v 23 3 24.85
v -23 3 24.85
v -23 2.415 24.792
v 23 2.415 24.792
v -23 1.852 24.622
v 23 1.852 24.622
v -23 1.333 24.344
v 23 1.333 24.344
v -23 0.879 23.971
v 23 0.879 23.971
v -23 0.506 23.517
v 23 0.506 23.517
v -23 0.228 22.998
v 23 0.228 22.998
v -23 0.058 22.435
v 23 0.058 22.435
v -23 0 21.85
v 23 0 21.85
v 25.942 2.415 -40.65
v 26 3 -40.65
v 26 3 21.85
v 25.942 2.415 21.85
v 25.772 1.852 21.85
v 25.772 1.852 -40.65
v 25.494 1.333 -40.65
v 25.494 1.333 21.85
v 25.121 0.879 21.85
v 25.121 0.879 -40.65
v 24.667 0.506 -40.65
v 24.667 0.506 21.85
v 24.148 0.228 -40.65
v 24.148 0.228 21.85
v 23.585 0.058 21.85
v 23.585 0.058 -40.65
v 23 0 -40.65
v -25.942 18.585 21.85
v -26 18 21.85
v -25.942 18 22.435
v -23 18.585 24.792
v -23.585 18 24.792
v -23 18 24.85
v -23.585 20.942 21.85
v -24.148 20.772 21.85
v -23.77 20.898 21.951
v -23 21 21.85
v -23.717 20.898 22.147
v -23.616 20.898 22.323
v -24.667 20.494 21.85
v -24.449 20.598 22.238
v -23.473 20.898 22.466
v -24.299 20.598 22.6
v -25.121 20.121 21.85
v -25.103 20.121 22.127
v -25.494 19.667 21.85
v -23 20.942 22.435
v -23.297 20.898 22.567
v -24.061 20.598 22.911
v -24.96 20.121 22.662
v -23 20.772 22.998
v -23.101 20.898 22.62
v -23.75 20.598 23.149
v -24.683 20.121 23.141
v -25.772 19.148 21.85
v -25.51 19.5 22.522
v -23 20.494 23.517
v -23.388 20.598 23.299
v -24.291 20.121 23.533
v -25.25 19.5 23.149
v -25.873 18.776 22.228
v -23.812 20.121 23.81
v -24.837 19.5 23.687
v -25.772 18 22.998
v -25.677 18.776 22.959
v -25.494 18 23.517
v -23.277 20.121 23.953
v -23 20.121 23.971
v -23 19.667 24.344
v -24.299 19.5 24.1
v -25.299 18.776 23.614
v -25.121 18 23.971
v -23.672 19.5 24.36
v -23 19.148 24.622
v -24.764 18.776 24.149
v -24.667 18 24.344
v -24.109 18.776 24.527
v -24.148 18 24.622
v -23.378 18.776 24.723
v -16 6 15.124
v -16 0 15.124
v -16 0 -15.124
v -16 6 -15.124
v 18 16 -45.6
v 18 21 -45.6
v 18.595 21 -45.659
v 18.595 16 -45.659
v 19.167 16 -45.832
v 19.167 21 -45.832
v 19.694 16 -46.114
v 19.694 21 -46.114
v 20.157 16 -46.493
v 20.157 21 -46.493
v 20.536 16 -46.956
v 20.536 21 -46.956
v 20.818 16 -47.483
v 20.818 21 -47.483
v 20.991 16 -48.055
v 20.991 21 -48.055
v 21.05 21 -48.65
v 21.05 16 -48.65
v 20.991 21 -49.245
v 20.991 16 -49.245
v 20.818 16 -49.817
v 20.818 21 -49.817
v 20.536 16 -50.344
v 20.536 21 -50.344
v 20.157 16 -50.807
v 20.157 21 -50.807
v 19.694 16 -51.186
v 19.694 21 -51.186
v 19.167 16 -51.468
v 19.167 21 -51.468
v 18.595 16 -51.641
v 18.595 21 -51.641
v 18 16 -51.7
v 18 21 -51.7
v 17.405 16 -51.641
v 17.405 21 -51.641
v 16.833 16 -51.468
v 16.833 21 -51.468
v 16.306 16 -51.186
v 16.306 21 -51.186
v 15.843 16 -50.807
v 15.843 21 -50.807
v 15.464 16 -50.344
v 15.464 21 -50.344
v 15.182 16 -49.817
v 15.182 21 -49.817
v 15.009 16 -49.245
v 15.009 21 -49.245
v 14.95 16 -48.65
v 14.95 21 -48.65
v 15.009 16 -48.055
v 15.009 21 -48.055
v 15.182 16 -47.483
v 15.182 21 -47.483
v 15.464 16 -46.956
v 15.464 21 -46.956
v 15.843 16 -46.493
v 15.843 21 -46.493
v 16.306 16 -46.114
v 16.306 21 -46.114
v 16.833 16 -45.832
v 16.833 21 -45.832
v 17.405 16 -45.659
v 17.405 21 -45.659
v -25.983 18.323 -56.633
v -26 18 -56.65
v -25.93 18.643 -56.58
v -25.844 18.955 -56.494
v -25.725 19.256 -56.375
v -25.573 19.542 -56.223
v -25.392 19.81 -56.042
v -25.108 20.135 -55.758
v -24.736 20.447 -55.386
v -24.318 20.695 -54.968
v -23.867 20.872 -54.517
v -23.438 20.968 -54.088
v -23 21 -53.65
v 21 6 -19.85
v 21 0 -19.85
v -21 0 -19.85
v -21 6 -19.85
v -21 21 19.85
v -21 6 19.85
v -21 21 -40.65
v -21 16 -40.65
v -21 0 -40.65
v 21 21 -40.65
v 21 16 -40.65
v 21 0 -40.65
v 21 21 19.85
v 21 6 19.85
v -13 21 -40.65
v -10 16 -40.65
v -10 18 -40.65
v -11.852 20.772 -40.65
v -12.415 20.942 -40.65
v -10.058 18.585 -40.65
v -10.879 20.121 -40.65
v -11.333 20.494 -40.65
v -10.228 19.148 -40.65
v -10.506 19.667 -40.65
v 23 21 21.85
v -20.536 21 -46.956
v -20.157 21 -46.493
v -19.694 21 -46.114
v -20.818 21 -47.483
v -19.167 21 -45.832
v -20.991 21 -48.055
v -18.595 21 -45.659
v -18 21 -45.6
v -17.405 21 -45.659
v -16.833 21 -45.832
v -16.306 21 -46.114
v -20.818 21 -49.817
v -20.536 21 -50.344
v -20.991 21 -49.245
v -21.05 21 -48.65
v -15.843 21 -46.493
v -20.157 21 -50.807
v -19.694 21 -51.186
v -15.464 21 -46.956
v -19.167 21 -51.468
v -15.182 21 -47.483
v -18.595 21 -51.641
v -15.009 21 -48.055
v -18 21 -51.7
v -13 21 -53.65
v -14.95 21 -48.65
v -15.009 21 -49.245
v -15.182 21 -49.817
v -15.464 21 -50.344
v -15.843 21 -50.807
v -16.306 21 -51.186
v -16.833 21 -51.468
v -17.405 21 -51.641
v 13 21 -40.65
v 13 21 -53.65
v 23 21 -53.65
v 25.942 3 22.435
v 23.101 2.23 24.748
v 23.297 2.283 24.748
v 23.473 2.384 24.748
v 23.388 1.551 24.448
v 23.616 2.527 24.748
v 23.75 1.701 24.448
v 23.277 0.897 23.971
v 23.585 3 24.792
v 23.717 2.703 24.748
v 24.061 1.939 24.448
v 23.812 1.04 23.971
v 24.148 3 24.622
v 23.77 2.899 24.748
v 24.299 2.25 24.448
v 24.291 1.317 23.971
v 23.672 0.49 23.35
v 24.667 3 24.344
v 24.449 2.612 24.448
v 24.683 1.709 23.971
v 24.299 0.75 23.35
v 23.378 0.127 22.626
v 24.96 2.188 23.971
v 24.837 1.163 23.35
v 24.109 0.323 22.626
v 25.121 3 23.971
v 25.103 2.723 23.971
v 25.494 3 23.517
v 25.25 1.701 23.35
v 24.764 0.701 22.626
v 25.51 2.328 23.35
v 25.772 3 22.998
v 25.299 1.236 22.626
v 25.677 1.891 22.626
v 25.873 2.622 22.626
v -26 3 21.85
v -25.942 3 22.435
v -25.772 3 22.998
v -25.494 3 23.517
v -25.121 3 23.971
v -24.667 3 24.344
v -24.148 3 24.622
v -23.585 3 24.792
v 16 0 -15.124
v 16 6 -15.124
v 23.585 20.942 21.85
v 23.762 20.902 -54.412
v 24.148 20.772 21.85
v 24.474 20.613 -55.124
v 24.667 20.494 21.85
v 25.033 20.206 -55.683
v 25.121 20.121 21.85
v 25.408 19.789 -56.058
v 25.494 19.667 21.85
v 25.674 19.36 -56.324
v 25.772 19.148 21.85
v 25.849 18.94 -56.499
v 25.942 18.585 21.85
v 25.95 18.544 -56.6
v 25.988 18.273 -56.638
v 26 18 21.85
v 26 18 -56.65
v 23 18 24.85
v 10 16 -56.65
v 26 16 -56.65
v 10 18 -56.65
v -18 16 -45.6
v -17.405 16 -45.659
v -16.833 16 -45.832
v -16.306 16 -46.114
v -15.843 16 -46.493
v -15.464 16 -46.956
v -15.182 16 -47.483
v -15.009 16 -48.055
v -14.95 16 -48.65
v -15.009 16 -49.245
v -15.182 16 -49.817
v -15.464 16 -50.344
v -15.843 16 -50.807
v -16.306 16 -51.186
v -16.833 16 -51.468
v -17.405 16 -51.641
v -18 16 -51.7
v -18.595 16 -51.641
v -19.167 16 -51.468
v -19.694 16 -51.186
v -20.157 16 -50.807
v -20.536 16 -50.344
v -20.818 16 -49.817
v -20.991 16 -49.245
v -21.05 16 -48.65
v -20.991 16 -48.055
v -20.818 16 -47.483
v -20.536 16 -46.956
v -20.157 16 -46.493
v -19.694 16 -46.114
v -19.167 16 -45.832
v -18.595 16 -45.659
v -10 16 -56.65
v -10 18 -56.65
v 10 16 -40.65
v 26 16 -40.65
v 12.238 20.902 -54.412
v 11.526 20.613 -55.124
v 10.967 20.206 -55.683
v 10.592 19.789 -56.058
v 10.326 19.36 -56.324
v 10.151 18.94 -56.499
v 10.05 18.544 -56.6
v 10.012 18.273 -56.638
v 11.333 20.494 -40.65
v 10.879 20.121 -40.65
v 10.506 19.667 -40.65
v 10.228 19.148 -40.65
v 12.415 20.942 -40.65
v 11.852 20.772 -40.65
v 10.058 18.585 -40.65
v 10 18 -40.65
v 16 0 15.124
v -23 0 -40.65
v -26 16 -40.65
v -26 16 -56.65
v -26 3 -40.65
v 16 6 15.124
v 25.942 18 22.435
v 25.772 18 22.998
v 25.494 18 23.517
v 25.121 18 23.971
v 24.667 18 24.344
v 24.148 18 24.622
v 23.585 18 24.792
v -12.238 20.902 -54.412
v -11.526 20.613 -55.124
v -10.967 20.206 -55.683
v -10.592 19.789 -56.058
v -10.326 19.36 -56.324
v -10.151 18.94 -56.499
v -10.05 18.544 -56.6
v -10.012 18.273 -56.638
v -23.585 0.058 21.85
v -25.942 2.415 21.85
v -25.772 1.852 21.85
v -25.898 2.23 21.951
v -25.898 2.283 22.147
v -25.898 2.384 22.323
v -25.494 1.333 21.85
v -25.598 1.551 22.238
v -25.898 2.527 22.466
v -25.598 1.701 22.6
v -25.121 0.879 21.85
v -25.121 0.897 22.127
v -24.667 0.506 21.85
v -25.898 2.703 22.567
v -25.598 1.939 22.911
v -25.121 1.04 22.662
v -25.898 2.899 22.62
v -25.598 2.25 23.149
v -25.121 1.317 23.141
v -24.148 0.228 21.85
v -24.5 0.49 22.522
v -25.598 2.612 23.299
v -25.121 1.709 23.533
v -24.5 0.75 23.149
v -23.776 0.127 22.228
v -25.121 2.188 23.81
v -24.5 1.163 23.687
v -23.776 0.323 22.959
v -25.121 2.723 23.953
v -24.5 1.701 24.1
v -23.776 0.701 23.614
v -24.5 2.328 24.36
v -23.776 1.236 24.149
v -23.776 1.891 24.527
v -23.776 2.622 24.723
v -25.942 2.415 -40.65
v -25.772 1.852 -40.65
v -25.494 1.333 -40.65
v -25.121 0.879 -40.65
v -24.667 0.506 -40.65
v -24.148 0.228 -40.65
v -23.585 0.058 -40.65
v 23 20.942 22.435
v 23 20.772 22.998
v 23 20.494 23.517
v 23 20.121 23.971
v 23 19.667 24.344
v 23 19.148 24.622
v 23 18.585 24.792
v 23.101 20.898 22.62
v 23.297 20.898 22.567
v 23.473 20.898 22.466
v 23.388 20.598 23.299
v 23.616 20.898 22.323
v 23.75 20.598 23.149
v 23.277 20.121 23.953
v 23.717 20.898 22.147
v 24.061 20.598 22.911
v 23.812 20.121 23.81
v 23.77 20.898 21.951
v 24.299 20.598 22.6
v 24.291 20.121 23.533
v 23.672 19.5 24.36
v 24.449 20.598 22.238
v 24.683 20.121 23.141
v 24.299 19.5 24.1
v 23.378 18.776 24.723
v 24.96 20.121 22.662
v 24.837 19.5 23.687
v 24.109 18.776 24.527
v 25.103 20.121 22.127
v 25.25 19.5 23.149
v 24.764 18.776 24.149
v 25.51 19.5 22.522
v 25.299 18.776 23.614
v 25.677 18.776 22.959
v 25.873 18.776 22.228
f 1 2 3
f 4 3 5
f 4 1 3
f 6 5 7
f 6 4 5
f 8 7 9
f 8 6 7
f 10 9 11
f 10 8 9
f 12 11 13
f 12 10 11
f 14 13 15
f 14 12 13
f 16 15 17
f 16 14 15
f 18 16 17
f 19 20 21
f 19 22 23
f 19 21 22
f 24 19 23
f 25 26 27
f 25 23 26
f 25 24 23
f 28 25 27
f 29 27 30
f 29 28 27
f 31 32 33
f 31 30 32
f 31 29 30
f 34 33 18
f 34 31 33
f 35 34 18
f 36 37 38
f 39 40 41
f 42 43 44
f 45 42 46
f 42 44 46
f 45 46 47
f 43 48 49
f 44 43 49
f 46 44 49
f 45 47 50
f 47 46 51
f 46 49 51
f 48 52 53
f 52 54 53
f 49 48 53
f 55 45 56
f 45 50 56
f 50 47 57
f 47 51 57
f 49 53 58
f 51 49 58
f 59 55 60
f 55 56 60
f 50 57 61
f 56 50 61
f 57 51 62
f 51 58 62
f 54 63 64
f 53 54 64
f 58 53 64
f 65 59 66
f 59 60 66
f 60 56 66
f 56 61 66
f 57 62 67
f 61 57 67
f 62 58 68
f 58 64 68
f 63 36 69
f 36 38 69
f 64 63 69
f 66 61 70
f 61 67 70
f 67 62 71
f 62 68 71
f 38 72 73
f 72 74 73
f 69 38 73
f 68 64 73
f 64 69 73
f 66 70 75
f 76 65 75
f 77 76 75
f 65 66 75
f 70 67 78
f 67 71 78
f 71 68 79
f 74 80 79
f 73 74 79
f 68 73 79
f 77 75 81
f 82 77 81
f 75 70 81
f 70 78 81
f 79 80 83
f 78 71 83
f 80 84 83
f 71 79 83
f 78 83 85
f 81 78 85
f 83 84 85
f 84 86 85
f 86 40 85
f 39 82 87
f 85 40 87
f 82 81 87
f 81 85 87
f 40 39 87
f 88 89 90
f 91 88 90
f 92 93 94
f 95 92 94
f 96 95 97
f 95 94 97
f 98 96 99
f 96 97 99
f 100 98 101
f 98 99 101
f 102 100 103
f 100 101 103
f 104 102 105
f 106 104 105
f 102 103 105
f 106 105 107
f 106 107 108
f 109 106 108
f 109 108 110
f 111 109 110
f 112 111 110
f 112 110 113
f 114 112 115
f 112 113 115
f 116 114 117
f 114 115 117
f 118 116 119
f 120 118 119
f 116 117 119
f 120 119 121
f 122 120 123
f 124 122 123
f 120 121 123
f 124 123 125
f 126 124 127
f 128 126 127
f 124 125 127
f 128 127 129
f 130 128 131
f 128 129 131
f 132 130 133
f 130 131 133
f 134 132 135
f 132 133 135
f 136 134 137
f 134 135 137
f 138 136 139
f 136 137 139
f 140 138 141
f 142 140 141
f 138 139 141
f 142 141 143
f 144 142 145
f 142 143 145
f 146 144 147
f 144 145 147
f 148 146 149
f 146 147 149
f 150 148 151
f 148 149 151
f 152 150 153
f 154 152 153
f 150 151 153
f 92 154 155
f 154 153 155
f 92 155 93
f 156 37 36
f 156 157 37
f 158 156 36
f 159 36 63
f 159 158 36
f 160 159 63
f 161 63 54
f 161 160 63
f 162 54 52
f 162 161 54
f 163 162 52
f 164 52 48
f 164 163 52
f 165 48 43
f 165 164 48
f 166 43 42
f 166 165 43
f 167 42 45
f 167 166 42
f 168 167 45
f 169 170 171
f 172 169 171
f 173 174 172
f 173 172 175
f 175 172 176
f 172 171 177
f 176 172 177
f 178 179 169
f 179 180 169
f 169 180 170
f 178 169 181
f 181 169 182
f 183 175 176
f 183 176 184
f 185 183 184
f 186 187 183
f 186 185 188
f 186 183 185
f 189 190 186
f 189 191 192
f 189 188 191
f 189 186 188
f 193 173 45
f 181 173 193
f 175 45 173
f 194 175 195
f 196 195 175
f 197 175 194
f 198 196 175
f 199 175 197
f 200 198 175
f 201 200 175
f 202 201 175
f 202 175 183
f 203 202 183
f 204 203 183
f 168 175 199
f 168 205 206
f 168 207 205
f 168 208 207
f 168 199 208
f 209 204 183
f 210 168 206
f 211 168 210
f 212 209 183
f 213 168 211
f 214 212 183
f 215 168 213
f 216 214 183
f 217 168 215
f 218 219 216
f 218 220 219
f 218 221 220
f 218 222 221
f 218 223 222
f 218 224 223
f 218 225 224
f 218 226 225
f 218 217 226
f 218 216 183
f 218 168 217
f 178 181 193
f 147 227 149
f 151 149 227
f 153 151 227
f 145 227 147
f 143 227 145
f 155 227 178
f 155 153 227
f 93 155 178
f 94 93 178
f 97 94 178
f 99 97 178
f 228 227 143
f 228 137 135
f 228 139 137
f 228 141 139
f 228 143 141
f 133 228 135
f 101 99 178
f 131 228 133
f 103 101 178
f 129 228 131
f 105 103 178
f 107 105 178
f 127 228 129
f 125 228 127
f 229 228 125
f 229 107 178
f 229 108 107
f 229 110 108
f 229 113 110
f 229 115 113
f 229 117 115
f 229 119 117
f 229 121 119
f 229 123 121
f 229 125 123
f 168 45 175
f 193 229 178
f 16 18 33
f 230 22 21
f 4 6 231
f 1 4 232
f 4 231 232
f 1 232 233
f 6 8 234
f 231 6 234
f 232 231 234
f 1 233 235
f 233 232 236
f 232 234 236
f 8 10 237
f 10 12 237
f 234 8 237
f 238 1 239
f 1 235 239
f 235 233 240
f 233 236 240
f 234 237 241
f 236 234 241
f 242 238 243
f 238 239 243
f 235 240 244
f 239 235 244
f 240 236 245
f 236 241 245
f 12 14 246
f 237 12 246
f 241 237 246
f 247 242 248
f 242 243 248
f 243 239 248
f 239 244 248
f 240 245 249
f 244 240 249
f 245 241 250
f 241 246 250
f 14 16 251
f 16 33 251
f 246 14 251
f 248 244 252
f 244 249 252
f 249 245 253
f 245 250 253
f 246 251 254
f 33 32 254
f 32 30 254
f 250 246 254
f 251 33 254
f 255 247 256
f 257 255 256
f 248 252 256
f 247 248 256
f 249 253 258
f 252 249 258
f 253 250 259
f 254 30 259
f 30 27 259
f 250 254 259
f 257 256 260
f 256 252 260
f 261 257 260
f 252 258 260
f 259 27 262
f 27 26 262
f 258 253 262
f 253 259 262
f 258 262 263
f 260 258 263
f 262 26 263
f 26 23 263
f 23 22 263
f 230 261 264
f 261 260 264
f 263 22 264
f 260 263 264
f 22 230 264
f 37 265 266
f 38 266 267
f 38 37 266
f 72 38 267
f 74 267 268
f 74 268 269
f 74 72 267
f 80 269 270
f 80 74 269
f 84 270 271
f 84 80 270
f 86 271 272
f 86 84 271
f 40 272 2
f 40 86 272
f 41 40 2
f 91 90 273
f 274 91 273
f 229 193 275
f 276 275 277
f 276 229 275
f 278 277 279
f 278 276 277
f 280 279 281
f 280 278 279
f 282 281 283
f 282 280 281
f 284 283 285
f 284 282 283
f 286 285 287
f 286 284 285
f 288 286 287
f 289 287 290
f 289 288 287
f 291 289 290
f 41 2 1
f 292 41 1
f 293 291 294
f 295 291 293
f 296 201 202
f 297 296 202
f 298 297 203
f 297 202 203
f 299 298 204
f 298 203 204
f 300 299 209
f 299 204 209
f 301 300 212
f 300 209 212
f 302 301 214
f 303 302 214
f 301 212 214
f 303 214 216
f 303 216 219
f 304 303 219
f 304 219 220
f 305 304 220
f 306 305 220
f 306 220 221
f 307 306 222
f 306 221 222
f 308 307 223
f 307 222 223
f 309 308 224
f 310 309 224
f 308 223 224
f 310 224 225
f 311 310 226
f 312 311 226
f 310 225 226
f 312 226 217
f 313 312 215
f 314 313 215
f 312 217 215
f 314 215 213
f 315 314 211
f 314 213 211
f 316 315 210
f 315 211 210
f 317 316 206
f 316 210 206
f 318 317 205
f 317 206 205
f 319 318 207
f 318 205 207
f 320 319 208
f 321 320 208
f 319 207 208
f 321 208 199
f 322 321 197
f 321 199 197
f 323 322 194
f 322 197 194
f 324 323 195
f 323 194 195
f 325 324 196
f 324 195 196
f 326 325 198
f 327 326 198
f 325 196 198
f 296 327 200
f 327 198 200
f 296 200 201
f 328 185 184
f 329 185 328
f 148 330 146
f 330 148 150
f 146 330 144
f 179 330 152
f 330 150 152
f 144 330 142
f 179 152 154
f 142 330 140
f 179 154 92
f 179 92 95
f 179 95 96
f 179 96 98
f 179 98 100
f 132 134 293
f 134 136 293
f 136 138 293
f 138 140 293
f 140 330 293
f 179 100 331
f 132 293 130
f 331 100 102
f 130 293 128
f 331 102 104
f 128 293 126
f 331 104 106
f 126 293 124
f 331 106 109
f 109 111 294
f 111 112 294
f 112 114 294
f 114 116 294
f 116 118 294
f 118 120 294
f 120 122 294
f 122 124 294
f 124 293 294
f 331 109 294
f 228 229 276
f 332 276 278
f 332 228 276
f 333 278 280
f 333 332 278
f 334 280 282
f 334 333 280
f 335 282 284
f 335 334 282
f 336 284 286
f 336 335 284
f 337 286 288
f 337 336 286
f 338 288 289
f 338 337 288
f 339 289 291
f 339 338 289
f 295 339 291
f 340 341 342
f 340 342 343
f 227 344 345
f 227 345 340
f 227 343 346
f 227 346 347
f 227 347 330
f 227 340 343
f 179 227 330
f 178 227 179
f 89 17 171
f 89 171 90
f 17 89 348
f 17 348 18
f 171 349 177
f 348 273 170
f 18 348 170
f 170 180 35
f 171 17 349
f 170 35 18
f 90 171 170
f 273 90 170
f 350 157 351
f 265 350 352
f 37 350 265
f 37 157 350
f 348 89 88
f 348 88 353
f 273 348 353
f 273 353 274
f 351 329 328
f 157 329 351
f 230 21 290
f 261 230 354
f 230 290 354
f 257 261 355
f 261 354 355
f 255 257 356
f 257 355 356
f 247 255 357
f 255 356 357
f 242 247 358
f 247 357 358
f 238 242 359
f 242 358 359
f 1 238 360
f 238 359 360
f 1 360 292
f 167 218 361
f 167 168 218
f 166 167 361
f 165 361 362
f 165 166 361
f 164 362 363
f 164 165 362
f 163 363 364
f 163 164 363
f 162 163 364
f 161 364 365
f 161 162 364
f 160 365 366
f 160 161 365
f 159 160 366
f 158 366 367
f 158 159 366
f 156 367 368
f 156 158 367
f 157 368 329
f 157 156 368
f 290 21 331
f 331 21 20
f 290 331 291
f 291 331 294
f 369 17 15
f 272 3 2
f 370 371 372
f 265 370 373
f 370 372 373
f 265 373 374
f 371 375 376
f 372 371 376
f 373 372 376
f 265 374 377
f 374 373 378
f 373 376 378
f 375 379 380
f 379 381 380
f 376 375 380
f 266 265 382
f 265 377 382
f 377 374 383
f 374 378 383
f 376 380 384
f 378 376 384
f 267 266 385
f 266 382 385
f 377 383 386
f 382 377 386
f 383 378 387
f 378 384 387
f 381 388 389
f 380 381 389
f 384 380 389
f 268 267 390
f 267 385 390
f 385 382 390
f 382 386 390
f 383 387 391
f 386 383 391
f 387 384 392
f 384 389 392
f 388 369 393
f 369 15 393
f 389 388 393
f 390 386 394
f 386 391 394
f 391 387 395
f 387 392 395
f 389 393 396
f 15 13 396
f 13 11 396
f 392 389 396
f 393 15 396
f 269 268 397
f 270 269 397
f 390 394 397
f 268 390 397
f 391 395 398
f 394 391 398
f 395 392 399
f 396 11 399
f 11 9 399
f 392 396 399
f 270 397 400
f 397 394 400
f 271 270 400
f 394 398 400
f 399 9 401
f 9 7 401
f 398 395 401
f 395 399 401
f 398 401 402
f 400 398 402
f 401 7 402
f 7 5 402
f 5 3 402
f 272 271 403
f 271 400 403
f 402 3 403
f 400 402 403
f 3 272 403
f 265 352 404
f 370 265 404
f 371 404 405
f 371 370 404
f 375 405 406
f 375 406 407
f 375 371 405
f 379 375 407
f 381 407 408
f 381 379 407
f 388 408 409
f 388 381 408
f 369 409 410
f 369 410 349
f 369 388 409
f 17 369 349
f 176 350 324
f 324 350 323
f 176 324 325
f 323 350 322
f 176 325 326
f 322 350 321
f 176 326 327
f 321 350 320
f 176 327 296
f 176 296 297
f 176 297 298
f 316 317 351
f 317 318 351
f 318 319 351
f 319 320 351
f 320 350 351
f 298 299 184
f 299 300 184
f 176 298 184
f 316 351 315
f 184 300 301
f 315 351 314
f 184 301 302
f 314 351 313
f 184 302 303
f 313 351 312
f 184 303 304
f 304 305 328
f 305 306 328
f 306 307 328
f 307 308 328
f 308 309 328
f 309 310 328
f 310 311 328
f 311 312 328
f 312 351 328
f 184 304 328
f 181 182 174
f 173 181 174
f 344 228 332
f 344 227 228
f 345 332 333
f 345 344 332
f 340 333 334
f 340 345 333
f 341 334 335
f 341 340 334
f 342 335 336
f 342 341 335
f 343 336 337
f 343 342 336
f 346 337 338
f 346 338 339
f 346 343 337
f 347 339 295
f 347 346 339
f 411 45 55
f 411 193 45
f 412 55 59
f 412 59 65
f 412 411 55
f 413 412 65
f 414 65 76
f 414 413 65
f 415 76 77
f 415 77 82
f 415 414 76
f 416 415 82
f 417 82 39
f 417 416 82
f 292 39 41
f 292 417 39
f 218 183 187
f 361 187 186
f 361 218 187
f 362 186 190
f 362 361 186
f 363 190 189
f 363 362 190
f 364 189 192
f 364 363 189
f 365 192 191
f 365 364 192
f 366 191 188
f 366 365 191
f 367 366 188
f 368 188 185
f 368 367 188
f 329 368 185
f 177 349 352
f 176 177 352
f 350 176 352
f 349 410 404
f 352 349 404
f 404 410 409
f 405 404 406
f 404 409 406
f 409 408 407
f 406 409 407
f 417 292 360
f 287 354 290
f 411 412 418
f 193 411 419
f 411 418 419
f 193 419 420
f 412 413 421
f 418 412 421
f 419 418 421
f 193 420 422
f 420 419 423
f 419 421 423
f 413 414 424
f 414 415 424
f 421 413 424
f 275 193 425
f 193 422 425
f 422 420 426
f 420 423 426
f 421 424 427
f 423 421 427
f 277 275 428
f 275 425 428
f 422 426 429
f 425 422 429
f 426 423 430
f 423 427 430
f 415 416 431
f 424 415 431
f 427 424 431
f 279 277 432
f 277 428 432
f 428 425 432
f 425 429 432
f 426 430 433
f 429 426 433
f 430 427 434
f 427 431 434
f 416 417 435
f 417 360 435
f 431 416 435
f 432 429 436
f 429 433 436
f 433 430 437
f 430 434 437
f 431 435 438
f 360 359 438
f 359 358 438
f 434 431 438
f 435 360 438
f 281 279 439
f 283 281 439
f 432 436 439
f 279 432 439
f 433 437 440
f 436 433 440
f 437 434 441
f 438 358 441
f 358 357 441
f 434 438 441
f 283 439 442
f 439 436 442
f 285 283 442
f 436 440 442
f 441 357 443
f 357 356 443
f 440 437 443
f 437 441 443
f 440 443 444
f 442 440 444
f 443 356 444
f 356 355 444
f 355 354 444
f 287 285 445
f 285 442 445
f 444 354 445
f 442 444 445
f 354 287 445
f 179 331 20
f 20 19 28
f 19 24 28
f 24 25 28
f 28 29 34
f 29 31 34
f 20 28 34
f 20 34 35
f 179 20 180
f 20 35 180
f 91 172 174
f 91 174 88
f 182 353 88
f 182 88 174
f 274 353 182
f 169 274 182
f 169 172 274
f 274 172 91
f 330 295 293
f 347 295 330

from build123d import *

# Parameters (mm, degrees)
SKETCH1_W           = 32
SKETCH1_H           = 30.247619048
BOSS_EXTRUDE1_DEPTH = 6
BOSS_EXTRUDE2_DEPTH = 21
BOSS_EXTRUDE3_START = 21
SKETCH1_6_R         = 3.05
BOSS_EXTRUDE3_DEPTH = 5
FILLET1_R           = 3


with BuildPart() as part:
    # Sketch1 → Boss-Extrude1 (new body)
    with BuildSketch(Plane(origin=(0, 0, 0), x_dir=(1, 0, 0), z_dir=(0, 1, 0))):
        Polygon((-26, 40.65), (-26, -24.85), (26, -24.85), (26, 40.65), (21, 40.65), (21, 19.85), (-21, 19.85), (-21, 40.65), align=None)
        Rectangle(SKETCH1_W, SKETCH1_H, mode=Mode.SUBTRACT)
    extrude(amount=BOSS_EXTRUDE1_DEPTH)

    # Sketch1_5 → Boss-Extrude2 (add)
    with BuildSketch(Plane(origin=(0, 0, 0), x_dir=(1, 0, 0), z_dir=(0, 1, 0))):
        Polygon((-26, 40.65), (-26, -24.85), (26, -24.85), (26, 40.65), (21, 40.65), (21, 19.85), (21, -19.85), (-21, -19.85), (-21, 19.85), (-21, 40.65), align=None)
    extrude(amount=BOSS_EXTRUDE2_DEPTH)

    # Sketch1_6 → Boss-Extrude3 (add)
    with BuildSketch(Plane(origin=(0, 0, 0), x_dir=(1, 0, 0), z_dir=(0, 1, 0)).offset(BOSS_EXTRUDE3_START)):
        Polygon((-26, 56.65), (-26, 40.65), (-21, 40.65), (-10, 40.65), (-10, 56.65), align=None)
        with Locations(Location((-18, 48.65, 0), (0, 0, 270))):  # turned: the seam where the file's is
            Circle(SKETCH1_6_R, mode=Mode.SUBTRACT)
        Polygon((21, 40.65), (26, 40.65), (26, 56.65), (10, 56.65), (10, 40.65), align=None)
        with Locations(Location((18, 48.65, 0), (0, 0, 270))):  # turned: the seam where the file's is
            Circle(SKETCH1_6_R, mode=Mode.SUBTRACT)
    extrude(amount=-BOSS_EXTRUDE3_DEPTH)

    # Fillet1
    fillet1_edges = [part.edges().sort_by_distance(p)[0] for p in [
        (26, 0, -7.9),
        (0, 0, 24.85),
        (-26, 0, -7.9),
        (26, 10.5, 24.85),
        (-26, 10.5, 24.85),
        (-26, 21, -15.9),
        (0, 21, 24.85),
        (26, 21, -15.9),
        (-10, 21, -48.65),
        (-18, 21, -56.65),
        (10, 21, -48.65),
        (18, 21, -56.65),
    ]]
    fillet(fillet1_edges, radius=FILLET1_R)


solid = part.part
